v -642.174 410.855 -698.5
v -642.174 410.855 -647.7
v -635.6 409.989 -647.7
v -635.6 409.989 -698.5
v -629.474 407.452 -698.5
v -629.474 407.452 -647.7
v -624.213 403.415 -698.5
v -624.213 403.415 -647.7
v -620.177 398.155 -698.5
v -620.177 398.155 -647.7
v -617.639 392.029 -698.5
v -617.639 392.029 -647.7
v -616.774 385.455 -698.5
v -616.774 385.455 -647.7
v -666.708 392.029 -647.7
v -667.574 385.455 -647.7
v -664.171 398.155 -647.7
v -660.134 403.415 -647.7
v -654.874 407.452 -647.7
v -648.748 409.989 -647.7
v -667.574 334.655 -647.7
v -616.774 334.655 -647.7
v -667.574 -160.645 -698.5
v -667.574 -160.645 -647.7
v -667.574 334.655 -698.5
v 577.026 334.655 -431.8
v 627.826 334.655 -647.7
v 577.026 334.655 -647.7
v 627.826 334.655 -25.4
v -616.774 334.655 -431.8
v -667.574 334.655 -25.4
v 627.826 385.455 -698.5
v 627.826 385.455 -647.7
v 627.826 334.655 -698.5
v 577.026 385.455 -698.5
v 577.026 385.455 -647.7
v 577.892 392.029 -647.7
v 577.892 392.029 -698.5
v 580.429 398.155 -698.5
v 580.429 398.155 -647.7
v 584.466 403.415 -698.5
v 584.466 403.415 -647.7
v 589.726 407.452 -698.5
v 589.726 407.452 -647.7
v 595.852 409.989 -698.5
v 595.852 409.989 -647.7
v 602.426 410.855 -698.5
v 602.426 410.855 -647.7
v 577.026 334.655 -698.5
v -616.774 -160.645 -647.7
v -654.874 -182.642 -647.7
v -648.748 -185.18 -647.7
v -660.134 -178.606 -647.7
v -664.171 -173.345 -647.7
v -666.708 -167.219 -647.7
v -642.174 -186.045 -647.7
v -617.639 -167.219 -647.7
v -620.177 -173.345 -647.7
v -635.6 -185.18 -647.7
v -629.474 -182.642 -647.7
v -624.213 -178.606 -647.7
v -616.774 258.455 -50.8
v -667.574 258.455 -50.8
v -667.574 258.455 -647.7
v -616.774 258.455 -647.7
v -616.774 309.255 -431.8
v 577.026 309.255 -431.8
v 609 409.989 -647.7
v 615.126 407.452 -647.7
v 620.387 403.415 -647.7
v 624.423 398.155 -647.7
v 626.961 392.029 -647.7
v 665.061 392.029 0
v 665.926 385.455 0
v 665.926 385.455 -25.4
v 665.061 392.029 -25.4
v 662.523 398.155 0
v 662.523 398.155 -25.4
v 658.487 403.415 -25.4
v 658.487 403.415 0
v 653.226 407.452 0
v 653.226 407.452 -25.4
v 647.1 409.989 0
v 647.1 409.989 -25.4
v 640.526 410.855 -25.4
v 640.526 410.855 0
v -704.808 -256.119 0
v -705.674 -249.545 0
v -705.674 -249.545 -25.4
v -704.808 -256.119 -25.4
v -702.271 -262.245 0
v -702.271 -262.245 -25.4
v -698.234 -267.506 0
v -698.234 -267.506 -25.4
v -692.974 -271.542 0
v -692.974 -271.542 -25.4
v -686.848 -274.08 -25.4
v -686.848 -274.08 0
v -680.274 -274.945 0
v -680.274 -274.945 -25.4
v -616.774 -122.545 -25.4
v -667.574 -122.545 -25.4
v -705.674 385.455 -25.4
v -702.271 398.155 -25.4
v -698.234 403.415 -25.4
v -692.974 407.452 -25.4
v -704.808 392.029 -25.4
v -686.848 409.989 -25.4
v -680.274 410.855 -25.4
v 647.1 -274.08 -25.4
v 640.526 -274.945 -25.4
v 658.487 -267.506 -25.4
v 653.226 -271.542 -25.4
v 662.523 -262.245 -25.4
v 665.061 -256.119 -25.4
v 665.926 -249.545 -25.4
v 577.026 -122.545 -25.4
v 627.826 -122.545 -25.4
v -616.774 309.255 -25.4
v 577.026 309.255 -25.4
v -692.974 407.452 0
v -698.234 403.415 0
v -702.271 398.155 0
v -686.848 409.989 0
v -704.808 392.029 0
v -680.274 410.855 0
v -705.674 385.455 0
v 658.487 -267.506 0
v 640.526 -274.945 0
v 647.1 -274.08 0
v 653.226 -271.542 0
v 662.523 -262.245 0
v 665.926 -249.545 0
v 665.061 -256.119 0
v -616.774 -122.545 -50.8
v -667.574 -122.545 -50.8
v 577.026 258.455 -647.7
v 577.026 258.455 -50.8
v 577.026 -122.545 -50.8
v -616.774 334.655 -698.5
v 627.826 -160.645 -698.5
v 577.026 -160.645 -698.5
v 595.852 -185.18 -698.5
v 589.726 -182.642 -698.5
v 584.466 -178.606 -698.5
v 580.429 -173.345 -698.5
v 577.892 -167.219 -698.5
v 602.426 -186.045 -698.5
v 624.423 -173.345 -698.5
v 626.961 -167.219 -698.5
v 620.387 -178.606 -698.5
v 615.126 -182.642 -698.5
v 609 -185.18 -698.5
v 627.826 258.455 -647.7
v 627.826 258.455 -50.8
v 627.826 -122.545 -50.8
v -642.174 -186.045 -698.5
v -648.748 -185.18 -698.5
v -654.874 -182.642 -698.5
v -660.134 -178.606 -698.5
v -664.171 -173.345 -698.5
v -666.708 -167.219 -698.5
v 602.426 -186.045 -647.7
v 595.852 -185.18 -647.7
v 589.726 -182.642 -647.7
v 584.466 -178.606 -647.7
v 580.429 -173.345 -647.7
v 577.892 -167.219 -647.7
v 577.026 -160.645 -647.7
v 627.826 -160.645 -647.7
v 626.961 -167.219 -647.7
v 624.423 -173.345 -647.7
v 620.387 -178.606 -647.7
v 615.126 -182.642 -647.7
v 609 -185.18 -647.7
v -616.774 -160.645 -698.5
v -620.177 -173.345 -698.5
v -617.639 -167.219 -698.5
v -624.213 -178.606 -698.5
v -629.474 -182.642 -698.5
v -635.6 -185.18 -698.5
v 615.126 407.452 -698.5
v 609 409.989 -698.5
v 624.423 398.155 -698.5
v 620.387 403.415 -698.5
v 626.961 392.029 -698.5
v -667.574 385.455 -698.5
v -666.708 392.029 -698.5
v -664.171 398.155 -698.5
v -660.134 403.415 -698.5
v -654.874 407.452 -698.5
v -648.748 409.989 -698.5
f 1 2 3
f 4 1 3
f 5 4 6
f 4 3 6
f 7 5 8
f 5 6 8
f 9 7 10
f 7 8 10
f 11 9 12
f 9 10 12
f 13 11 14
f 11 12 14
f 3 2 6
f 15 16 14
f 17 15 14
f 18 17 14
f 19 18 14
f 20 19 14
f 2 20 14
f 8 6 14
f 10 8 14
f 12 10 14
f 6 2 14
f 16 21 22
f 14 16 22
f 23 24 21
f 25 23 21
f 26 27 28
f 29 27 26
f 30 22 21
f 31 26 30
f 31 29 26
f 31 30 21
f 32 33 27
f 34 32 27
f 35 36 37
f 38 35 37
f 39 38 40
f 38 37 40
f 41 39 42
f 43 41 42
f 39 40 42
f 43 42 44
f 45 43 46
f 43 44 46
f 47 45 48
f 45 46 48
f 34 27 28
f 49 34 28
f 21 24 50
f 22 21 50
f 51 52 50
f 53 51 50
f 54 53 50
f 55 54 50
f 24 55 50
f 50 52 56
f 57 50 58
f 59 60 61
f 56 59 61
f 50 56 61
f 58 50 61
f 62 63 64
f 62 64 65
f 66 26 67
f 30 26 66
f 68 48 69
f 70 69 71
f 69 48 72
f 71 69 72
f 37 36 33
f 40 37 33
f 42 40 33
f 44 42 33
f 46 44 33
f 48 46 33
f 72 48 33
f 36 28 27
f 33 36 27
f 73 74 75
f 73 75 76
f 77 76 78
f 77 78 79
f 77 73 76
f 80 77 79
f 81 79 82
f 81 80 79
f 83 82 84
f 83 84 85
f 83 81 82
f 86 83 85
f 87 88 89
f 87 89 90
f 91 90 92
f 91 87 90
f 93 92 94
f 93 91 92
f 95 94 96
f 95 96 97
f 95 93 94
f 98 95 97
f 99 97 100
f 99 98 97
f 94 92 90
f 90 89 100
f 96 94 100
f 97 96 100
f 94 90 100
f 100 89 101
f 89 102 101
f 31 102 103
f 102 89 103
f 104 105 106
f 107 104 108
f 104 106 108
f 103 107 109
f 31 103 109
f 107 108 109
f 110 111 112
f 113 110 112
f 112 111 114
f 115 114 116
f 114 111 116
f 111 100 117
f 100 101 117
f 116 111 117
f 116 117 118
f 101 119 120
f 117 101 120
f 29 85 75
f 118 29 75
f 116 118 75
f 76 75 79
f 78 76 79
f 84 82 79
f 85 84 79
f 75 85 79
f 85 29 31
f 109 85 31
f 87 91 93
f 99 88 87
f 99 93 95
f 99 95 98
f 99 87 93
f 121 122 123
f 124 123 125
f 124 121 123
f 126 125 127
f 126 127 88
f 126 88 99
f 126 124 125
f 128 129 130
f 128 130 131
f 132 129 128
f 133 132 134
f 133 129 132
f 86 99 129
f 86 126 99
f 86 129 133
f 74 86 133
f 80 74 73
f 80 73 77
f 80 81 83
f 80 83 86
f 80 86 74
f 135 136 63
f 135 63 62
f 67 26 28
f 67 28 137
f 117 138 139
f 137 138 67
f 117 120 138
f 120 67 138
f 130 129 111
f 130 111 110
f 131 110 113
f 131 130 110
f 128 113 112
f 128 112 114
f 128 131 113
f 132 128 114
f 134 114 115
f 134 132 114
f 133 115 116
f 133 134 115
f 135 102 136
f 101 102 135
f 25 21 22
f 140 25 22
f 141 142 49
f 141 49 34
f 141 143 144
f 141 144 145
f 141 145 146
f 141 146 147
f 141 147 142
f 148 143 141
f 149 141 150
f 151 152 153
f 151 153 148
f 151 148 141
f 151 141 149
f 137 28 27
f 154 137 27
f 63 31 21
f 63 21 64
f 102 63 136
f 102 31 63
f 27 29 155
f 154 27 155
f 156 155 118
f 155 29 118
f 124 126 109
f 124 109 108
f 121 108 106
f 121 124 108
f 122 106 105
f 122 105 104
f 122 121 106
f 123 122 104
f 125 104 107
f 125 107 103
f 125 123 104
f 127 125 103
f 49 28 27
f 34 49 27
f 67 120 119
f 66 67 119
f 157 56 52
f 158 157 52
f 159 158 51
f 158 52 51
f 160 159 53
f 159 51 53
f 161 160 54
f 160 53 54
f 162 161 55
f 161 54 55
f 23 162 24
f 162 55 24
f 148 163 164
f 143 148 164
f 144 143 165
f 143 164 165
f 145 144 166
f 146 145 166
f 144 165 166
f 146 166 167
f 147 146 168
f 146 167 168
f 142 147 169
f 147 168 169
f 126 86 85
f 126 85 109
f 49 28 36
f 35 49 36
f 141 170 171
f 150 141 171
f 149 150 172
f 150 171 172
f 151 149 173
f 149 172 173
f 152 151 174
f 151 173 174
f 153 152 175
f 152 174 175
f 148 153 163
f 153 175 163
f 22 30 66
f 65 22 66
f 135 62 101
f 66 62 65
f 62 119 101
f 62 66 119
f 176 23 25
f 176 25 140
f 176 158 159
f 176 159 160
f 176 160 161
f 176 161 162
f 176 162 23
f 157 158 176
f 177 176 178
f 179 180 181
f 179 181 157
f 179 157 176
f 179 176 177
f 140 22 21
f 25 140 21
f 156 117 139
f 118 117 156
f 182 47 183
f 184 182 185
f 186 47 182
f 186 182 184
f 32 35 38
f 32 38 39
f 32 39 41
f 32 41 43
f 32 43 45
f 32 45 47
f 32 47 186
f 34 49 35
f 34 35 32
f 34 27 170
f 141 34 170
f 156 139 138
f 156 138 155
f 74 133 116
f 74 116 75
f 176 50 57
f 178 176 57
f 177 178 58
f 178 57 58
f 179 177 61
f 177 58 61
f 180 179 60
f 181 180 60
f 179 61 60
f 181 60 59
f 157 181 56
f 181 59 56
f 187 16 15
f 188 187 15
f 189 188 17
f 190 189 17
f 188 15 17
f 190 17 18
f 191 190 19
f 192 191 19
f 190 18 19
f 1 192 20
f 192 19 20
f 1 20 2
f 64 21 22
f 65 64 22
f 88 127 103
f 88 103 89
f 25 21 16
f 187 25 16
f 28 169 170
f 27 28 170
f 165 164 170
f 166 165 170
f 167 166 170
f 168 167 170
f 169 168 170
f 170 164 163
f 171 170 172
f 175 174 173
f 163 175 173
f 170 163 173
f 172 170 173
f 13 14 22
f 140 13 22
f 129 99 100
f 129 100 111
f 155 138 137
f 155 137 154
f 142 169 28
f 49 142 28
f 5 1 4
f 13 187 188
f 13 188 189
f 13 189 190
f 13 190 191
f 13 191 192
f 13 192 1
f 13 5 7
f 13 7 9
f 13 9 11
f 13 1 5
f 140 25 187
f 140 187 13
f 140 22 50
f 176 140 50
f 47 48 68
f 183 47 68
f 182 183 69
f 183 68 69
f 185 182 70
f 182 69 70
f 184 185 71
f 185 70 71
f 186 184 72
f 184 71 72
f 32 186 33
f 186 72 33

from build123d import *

# Parameters (mm, degrees)
F1_DEPTH  = 25.4
F2_W      = 50.8
F2_H      = 381
F3_DEPTH  = 25.4
F4_DEPTH  = 25.4
F5_W      = 50.8
F5_H      = 50.8
F6_DEPTH  = 622.3
F7_W      = 50.8
F7_H      = 25.4
F8_DEPTH  = 622.3
F10_DEPTH = 50.8
F12_DEPTH = 50.8
F14_DEPTH = 50.8
F16_DEPTH = 50.8
F17_W     = 1193.8
F17_H     = 406.4
F18_DEPTH = 25.4


with BuildPart() as f1:
    # F0 (on Top) → F1 (new body)
    with BuildSketch(Plane.XY):
        with BuildLine():
            ThreePointArc((-705.673662, -249.545241), (-698.234174, -267.505753), (-680.273662, -274.945241))
            Line((-680.273662, -274.945241), (640.526338, -274.945241))
            ThreePointArc((640.526338, -274.945241), (658.486851, -267.505753), (665.926338, -249.545241))
            Line((665.926338, -249.545241), (665.926338, 385.454759))
            ThreePointArc((665.926338, 385.454759), (658.486851, 403.415271), (640.526338, 410.854759))
            Line((640.526338, 410.854759), (-680.273662, 410.854759))
            ThreePointArc((-680.273662, 410.854759), (-698.234174, 403.415271), (-705.673662, 385.454759))
            Line((-705.673662, 385.454759), (-705.673662, -249.545241))
        make_face()
    extrude(amount=-F1_DEPTH)

    # F2 (on face) → F3 (join)
    with BuildSketch(Plane(origin=(0, 0, -25.4), x_dir=(1, 0, 0), z_dir=(0, 0, -1))):
        with Locations((-642.173662, -67.954759)):
            Rectangle(F2_W, F2_H)
        with Locations((602.426338, -67.954759)):
            Rectangle(F2_W, F2_H)
    extrude(amount=F3_DEPTH)

    # F2 (on face) → F4 (join)
    with BuildSketch(Plane(origin=(0, 0, -25.4), x_dir=(1, 0, 0), z_dir=(0, 0, -1))):
        with Locations((-642.173662, -67.954759)):
            Rectangle(F2_W, F2_H)
        with Locations((602.426338, -67.954759)):
            Rectangle(F2_W, F2_H)
    extrude(amount=F4_DEPTH)

    # F5 (on face) → F6 (join)
    with BuildSketch(Plane(origin=(0, 0, -25.4), x_dir=(1, 0, 0), z_dir=(0, 0, -1))):
        with Locations((-642.173662, -283.854759)):
            Rectangle(F5_W, F5_H)
        with Locations((602.426338, -283.854759)):
            Rectangle(F5_W, F5_H)
    extrude(amount=F6_DEPTH)

    # F7 (on face) → F8 (join)
    with BuildSketch(Plane(origin=(0, 0, -25.4), x_dir=(1, 0, 0), z_dir=(0, 0, -1))):
        with Locations((-642.173662, -321.954759)):
            Rectangle(F7_W, F7_H)
        with Locations((602.426338, -321.954759)):
            Rectangle(F7_W, F7_H)
    extrude(amount=F8_DEPTH)

    # F17 (on face) → F18 (join)
    with BuildSketch(Plane(origin=(0, 334.654759, 0), x_dir=(-1, 0, 0), z_dir=(0, 1, 0))):
        with Locations((19.873662, -228.6)):
            Rectangle(F17_W, F17_H)
    extrude(amount=-F18_DEPTH)


with BuildPart() as f10:
    # F9 (on face) → F10 (new body)
    with BuildSketch(Plane(origin=(0, 0, -647.7), x_dir=(1, 0, 0), z_dir=(0, 0, -1))):
        with BuildLine():
            Line((-616.773662, -334.654759), (-667.573662, -334.654759))
            Line((-667.573662, -334.654759), (-667.573662, -385.454759))
            ThreePointArc((-667.573662, -385.454759), (-660.134174, -403.415271), (-642.173662, -410.854759))
            ThreePointArc((-642.173662, -410.854759), (-624.213149, -403.415271), (-616.773662, -385.454759))
            Line((-616.773662, -385.454759), (-616.773662, -334.654759))
        make_face()
    extrude(amount=F10_DEPTH)


with BuildPart() as f12:
    # F11 (on face) → F12 (new body)
    with BuildSketch(Plane(origin=(0, 0, -647.7), x_dir=(1, 0, 0), z_dir=(0, 0, -1))):
        with BuildLine():
            Line((-667.573662, 160.645241), (-667.573662, -334.654759))
            Line((-667.573662, -334.654759), (-616.773662, -334.654759))
            Line((-616.773662, -334.654759), (-616.773662, 160.645241))
            ThreePointArc((-616.773662, 160.645241), (-624.213149, 178.605753), (-642.173662, 186.045241))
            ThreePointArc((-642.173662, 186.045241), (-660.134174, 178.605753), (-667.573662, 160.645241))
        make_face()
    extrude(amount=F12_DEPTH)


with BuildPart() as f14:
    # F13 (on face) → F14 (new body)
    with BuildSketch(Plane(origin=(0, 0, -647.7), x_dir=(1, 0, 0), z_dir=(0, 0, -1))):
        with BuildLine():
            Line((627.826338, -334.654759), (577.026338, -334.654759))
            Line((577.026338, -334.654759), (577.026338, -385.454759))
            ThreePointArc((577.026338, -385.454759), (584.465826, -403.415271), (602.426338, -410.854759))
            ThreePointArc((602.426338, -410.854759), (620.386851, -403.415271), (627.826338, -385.454759))
            Line((627.826338, -385.454759), (627.826338, -334.654759))
        make_face()
    extrude(amount=F14_DEPTH)


with BuildPart() as f16:
    # F15 (on face) → F16 (new body)
    with BuildSketch(Plane(origin=(0, 0, -647.7), x_dir=(1, 0, 0), z_dir=(0, 0, -1))):
        with BuildLine():
            Line((577.026338, 160.645241), (577.026338, -334.654759))
            Line((577.026338, -334.654759), (627.826338, -334.654759))
            Line((627.826338, -334.654759), (627.826338, 160.645241))
            ThreePointArc((627.826338, 160.645241), (620.386851, 178.605753), (602.426338, 186.045241))
            ThreePointArc((602.426338, 186.045241), (584.465826, 178.605753), (577.026338, 160.645241))
        make_face()
    extrude(amount=F16_DEPTH)


solid = Compound([f1.part, f10.part, f12.part, f14.part, f16.part])
